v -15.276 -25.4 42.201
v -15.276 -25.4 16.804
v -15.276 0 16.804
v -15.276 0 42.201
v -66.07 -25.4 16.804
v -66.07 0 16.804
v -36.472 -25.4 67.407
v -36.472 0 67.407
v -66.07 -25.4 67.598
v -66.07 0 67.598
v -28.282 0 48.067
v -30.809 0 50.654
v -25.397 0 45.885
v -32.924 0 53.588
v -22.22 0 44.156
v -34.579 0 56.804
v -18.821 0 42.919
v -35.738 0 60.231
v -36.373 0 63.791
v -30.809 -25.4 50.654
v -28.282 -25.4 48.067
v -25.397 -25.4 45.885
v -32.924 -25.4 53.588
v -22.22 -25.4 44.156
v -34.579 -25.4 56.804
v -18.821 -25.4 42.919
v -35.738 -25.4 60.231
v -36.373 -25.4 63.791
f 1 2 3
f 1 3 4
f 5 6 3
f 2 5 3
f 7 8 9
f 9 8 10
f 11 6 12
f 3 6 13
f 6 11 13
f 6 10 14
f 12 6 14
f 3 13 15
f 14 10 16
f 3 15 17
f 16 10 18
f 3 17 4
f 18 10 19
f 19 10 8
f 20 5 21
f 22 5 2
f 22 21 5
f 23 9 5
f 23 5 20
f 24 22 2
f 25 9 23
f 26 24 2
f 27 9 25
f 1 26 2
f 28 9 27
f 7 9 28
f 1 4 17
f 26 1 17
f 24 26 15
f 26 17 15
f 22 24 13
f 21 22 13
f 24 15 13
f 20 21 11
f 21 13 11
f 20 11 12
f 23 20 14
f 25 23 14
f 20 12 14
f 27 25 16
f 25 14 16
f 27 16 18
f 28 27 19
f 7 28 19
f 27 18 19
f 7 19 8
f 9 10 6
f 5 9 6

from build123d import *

# Parameters (mm, degrees)
F1_DEPTH = 25.4


with BuildPart() as f1:
    # F0 (on Front) → F1 (new body)
    with BuildSketch(Plane.XZ):
        with BuildLine():
            Line((-36.472339, 67.40699), (-66.070311, 67.597948))
            Line((-66.070311, 67.597948), (-66.070311, 16.80401))
            Line((-66.070311, 16.80401), (-15.276372, 16.80401))
            Line((-15.276372, 16.80401), (-15.276372, 42.200983))
            ThreePointArc((-15.276372, 42.200983), (-30.809465, 50.654006), (-36.472339, 67.40699))
        make_face()
    extrude(amount=F1_DEPTH)


solid = f1.part
